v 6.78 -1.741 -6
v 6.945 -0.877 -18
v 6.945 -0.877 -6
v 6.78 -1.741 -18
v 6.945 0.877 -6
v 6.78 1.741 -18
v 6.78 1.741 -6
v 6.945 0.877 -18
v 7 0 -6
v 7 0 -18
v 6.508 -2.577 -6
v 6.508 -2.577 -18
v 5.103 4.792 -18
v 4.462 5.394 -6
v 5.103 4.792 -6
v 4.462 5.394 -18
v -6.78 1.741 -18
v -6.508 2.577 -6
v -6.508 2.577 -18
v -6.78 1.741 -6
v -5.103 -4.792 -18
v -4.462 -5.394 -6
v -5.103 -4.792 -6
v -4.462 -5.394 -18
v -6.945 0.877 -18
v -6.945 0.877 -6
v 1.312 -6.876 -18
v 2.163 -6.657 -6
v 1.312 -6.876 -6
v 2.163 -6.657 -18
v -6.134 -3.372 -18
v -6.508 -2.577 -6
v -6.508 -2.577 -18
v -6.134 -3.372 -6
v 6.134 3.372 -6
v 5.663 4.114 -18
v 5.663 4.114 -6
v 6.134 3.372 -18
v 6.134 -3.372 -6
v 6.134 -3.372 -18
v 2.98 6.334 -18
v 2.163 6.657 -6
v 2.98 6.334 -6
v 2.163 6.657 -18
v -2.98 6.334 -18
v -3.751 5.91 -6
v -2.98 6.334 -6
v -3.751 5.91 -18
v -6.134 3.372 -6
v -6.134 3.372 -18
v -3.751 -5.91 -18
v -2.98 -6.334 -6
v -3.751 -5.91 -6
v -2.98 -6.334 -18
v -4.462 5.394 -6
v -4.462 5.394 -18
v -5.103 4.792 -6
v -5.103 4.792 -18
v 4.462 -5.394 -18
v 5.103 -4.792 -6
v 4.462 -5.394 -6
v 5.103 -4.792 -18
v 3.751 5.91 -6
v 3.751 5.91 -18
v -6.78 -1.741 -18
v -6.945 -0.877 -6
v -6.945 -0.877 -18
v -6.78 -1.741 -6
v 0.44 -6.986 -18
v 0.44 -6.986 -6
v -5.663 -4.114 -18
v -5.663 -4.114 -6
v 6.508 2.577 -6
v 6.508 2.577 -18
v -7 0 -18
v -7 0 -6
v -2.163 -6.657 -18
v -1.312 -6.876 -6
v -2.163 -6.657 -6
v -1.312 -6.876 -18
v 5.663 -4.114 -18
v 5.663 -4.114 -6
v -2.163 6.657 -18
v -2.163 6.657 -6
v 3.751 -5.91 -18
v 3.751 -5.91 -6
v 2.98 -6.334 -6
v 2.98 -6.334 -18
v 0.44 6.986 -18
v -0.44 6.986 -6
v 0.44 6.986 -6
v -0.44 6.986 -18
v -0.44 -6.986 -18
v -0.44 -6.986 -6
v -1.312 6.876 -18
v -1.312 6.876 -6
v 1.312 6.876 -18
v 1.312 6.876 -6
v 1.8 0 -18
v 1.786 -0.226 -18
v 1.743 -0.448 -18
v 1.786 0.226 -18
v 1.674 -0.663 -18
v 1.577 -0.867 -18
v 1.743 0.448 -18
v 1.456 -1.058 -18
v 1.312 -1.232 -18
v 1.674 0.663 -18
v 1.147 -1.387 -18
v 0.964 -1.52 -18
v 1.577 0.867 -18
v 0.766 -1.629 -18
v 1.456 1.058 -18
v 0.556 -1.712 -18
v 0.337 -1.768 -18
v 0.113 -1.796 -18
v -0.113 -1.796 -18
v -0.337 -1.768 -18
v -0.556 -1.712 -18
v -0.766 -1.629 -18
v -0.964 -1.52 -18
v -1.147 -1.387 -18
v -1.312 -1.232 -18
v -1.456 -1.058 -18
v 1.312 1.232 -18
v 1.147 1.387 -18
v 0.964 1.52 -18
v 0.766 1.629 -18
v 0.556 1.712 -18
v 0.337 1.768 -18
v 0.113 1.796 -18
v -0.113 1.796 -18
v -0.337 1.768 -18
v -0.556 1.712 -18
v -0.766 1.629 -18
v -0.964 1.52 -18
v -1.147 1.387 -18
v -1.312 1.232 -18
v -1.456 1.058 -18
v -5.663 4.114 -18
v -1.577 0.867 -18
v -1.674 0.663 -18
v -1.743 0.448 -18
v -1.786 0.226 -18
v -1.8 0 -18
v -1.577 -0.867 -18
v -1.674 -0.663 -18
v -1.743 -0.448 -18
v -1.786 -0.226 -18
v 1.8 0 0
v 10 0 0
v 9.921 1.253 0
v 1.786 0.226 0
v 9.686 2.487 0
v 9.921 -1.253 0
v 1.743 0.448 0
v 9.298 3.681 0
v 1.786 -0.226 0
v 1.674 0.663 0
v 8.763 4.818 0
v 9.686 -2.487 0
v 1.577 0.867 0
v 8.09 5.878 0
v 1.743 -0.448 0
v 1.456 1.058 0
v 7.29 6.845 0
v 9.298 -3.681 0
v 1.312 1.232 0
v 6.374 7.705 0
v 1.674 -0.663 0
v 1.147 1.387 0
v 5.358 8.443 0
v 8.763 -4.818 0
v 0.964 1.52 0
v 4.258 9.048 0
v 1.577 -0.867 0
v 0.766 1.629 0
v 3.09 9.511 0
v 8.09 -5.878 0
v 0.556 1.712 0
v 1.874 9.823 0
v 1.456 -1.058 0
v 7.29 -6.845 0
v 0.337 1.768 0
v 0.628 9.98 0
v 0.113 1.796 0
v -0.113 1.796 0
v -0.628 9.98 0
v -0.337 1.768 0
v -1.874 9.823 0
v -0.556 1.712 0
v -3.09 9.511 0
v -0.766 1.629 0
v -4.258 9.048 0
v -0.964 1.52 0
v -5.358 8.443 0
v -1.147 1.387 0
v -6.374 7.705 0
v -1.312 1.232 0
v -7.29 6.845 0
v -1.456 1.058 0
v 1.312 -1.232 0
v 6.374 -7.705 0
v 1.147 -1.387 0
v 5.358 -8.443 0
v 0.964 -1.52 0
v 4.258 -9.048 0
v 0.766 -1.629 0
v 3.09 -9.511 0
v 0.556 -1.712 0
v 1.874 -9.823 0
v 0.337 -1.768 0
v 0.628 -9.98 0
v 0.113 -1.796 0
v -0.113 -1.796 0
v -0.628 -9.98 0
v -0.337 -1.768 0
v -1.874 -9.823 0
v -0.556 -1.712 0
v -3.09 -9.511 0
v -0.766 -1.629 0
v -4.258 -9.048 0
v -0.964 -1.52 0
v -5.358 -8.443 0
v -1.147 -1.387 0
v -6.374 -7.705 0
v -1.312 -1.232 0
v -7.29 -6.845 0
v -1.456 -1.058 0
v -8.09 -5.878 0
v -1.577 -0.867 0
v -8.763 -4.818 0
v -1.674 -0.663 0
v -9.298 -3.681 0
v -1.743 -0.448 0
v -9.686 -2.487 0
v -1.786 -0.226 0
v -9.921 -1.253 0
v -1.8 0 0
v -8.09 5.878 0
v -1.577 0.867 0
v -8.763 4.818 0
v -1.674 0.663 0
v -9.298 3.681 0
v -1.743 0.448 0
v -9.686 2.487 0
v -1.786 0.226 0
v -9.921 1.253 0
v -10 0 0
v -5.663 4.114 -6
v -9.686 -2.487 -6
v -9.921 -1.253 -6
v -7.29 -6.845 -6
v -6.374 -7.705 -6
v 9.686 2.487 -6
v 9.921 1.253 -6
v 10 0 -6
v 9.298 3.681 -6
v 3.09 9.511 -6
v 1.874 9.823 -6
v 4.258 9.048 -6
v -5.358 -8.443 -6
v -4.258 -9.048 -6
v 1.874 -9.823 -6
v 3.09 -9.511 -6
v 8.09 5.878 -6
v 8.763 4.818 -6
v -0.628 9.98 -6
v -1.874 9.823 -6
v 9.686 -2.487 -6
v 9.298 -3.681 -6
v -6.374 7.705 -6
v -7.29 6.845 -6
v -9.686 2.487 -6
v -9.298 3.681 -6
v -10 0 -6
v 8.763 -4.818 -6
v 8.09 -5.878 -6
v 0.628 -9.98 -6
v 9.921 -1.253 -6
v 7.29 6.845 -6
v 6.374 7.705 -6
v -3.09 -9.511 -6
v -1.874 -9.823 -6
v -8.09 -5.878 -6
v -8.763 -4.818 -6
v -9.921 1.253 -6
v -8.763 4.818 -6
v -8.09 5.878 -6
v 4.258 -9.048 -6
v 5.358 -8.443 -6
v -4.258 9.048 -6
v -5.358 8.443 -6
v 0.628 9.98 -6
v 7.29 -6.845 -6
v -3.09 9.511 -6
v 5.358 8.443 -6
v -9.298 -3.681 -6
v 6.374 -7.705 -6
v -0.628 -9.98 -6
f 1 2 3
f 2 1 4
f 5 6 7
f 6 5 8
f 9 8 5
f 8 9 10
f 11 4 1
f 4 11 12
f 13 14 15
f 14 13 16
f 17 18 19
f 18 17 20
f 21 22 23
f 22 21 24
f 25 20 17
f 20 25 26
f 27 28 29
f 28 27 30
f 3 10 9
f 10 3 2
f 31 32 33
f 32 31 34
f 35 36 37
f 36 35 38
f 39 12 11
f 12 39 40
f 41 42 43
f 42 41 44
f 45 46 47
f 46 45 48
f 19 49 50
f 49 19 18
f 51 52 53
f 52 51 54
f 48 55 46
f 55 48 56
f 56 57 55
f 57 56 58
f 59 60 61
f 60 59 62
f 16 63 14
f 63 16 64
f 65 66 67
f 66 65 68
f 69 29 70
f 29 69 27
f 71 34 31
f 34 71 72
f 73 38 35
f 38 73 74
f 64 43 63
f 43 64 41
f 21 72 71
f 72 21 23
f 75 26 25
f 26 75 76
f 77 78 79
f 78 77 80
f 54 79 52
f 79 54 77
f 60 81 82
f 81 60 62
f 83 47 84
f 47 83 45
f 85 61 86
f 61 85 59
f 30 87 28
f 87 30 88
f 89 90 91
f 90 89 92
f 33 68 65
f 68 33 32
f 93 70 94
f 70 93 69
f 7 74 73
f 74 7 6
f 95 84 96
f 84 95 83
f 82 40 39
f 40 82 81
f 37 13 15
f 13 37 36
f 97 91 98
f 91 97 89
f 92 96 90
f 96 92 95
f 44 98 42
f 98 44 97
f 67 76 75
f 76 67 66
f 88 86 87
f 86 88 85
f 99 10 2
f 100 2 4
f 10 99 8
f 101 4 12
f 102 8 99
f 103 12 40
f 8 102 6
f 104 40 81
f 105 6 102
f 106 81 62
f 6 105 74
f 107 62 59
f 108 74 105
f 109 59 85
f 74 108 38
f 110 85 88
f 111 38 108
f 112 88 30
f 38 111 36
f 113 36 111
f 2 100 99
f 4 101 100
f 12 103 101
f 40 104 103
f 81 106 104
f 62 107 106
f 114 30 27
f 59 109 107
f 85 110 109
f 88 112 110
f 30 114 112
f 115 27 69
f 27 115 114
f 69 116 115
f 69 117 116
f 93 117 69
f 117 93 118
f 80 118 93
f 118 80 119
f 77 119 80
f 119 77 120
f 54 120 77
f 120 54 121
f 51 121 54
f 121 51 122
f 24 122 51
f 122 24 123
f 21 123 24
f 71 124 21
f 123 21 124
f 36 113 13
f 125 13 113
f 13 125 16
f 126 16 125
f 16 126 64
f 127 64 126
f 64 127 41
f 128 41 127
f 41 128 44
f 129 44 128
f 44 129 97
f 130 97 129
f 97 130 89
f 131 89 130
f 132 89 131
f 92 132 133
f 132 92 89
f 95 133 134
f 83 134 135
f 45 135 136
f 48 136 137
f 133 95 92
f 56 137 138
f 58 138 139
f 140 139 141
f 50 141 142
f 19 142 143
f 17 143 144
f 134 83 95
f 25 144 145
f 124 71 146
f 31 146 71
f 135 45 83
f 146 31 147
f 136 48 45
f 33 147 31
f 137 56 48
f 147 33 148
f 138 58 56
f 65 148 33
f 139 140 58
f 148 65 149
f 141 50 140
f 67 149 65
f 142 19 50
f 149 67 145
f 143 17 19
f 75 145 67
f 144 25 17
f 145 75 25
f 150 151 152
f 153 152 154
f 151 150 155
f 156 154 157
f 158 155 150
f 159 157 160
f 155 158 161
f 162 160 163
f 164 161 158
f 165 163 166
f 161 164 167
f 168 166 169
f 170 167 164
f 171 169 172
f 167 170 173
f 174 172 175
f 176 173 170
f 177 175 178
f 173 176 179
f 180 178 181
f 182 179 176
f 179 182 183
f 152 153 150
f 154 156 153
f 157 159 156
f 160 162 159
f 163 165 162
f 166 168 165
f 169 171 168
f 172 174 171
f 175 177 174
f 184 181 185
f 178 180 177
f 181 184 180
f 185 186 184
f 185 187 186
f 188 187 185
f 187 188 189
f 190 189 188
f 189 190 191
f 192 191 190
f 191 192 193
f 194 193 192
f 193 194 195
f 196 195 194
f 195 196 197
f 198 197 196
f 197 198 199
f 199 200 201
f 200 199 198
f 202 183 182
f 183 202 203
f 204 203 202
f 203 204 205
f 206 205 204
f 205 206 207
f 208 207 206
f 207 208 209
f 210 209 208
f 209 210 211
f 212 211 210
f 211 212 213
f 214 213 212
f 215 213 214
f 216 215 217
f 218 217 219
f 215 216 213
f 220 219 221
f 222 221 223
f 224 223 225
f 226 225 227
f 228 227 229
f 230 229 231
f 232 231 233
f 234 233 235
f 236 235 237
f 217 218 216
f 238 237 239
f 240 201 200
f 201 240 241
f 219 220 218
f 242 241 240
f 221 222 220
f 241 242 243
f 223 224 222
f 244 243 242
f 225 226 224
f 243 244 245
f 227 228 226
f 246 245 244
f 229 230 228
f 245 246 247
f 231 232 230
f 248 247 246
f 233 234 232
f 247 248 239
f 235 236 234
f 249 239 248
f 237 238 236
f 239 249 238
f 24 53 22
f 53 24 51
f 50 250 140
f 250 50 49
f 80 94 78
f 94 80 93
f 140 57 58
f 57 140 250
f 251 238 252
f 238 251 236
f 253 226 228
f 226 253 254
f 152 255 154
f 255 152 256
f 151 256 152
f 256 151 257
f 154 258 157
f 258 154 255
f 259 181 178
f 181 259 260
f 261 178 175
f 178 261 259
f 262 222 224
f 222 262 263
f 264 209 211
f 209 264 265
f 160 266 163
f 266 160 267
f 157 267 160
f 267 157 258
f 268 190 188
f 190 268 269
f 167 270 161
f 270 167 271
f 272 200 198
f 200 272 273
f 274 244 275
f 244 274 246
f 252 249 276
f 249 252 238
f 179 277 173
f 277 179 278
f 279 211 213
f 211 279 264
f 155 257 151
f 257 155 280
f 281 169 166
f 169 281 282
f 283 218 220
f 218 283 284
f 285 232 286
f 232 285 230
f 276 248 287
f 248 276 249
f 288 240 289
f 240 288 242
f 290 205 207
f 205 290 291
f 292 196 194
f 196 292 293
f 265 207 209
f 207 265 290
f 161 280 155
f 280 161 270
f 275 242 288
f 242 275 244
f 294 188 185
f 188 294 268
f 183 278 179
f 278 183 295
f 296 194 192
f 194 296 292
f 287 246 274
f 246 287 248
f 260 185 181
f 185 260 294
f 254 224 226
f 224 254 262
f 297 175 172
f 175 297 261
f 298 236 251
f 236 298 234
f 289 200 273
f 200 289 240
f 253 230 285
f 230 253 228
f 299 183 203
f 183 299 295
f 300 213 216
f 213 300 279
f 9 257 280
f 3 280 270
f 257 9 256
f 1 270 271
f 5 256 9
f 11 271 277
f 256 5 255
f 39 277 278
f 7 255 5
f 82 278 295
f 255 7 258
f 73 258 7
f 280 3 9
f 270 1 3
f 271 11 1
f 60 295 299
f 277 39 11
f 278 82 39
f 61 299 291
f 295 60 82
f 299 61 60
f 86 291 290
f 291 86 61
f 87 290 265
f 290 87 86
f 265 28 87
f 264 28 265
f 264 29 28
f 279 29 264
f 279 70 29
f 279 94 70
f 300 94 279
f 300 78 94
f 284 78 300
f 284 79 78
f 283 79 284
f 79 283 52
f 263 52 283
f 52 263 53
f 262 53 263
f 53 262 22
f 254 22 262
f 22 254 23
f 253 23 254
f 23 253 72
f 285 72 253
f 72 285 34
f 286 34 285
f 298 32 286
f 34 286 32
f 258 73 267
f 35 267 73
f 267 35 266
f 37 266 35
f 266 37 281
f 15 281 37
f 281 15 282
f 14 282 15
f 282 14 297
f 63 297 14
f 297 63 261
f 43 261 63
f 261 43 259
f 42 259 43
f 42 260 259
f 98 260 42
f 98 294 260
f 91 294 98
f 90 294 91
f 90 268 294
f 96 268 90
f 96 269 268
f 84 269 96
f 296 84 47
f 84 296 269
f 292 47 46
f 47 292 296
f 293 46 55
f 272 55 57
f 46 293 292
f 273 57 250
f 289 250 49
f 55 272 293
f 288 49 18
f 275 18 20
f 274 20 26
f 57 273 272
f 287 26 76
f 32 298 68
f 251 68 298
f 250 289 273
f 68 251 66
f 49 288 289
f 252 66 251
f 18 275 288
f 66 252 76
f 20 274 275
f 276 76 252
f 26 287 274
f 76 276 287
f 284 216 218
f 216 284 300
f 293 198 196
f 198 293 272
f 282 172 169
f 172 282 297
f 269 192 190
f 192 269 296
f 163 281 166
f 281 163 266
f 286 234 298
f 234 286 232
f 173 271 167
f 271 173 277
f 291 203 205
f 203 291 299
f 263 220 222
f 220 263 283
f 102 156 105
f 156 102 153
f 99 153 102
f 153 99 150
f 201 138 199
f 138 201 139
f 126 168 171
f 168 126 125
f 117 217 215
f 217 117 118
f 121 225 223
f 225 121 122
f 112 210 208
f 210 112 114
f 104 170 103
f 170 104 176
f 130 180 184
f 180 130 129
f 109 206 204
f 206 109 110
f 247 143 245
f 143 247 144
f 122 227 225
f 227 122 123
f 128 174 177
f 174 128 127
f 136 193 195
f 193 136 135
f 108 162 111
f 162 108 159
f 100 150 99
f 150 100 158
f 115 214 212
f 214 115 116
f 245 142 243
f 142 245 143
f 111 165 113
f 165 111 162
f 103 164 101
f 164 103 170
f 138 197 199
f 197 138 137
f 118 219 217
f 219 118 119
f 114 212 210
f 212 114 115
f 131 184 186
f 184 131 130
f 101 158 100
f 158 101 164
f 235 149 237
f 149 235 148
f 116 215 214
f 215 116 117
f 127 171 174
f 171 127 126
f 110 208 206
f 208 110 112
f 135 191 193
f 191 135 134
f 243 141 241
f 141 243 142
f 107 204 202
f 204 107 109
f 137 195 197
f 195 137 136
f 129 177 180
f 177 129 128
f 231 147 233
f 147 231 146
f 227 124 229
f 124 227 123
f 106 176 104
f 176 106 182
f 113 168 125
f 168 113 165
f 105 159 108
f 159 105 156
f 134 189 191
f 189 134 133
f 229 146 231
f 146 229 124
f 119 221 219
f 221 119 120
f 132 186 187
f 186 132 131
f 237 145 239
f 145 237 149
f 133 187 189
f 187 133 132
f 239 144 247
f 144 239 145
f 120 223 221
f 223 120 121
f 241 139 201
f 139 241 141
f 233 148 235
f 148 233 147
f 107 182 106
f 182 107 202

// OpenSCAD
$fn = 50;


difference() {
	union() {
		translate(v = [0, 0, -18.0000000000]) {
			cylinder(h = 18, r = 7.0000000000);
		}
		translate(v = [0, 0, -6.0000000000]) {
			cylinder(h = 6, r = 10.0000000000);
		}
	}
	union() {
		#translate(v = [0, 0, -18]) {
			cylinder(h = 18, r = 1.8000000000);
		}
	}
}
